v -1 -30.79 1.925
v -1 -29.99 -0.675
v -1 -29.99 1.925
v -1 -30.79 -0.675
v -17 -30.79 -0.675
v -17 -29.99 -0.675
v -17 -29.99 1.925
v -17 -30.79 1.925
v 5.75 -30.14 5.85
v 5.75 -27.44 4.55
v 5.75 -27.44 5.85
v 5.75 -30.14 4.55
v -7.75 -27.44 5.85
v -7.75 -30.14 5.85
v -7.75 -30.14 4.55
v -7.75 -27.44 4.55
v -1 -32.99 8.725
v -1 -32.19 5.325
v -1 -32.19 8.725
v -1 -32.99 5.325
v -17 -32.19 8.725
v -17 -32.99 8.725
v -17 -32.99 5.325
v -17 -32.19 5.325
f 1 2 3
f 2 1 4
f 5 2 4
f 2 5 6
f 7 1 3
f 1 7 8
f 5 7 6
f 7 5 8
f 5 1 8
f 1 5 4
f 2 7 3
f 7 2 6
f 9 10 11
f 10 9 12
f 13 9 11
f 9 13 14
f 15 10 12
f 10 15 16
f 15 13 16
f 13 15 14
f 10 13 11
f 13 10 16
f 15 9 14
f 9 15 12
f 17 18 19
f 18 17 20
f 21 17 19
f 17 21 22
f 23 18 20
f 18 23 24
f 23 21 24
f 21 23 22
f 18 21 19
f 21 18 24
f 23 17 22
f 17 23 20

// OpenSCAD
include <BOSL2/std.scad>
include <BOSL2/rounding.scad>
vf=360;
//version number
version="10"; //version number
version_h=1; //depth of version number pocket

//epsilon value
eps=0.01;

//CASE BODY
//case stackup
echo("----------CASE----------");
face_h = 1.4;
lcd_h = 2.2;
pcb_h = 1.6;
standoff_h = 3.4;
floor_h = 1.4; //was 1.6... //was 2.4

top_h = face_h+lcd_h+pcb_h;
bottom_h = pcb_h+standoff_h+floor_h;
case_h=face_h+lcd_h+pcb_h+standoff_h+floor_h;
echo(top_h=top_h, bottom_h=bottom_h, case_h=case_h);

standoff_cut = 8.4; //length of the standoff arm excluding the rounded bit
standoff_d = 3; //diameter of standoff rounded bit

//mating walls
wall_inner_xy = 0.8; //inner wall thickness EACH side
wall_gap_xy=0.6; //was 0.6, but changed to one extruder width //gap between walls EACH side
wall_outer_xy=0.8; //outer wall thickness
wall_width=wall_inner_xy+wall_gap_xy+wall_outer_xy;
echo(wall_width=wall_width);

//pcb dimentions and tolerance
pcb_xy = 60;
pcb_tolerance_xy = 0.4; //spacing on EACH side
pcb_cavity_xy=(pcb_tolerance_xy*2)+pcb_xy; //bottom half PCB cavity
top_cavity_xy=pcb_cavity_xy+(wall_gap_xy*2)+(wall_inner_xy*2); //pcb+innerwall cavity in top
echo(pcb_cavity_xy=pcb_cavity_xy, top_cavity_xy=top_cavity_xy);

//full outer case dimentions
body_xy=(wall_outer_xy*2)+(wall_gap_xy*2)+(wall_inner_xy*2)+pcb_cavity_xy;
echo(body_xy=body_xy);

//edge chamfers, top and bottom
chamfer_top_h=2.4;
chamfer_bottom_h=1.4;

//TOP CASE FEATURES
//LCD body
lcd_x=34.6 + 2; //36.8;
lcd_y=47.8 + 2; //52.2;
//LCD viewable area
lcd_va_x=33.6 - 1; //32.4; 
lcd_va_y=43.6 - 1; //42.8;
lcd_va_base_h = 0.4; //two layers of material without chamfer on top of lcd
lcd_va_chamfer_h = face_h - lcd_va_base_h; //the chamfered "view port"
lcd_va_offset_y = 1.8 + (1/2); //from top of LCD body to top of viewable area

//10P header
head_10p_x = 11.6;
head_10p_y = 29.00;
head_10p_offset=4;

echo("------PROGRAMMING HEADER-------");
//cut in bottom of top half to accomidate the ends/solder of the programming header on the bottom layer
head_prog_x = 2.54+.4;
head_prog_y=(2.54*3)+0.55;
head_prog_bottom_h=lcd_h;  //bottom of header (top of PCB, top of case)
head_prog_top_h=floor_h;
head_prog_offset_x=10.75;
head_prog_offset_y=9.6;//9.6
head_prog_connector_max_h=floor_h+standoff_h;
echo(head_prog_connector_max_h=head_prog_connector_max_h);

//from datasheet for milled, low profile pin header
head_prog_connector_total_h=7.43;
head_prog_connector_pin_h=2.7;
head_prog_connector_body_h= head_prog_connector_total_h-head_prog_connector_pin_h;
head_prog_connector_clearance_h=head_prog_connector_max_h-head_prog_connector_body_h;
echo(head_prog_connector_body_h=head_prog_connector_body_h, head_prog_connector_clearance_h=head_prog_connector_clearance_h );

//mounting screws
echo("----------SCREWS----------");
screw_d=3.4;
screw_offset_xy=4;
screw_head_h=1.7;
screw_head_d1=screw_d;
screw_head_d2=6.2;
heatset_nut_d=4.4; //4.3/3.9;
heatset_nut_max_h=floor_h+standoff_h;
screw_distance_to_nut_h=top_h;
echo(screw_distance_to_nut_h=screw_distance_to_nut_h);

screw_h=8;
screw_depth_nut_h=screw_h-screw_distance_to_nut_h;
echo(screw_h=screw_h, screw_depth_nut_h=screw_depth_nut_h);

echo("----------NUTS----------");
heatset_nut_h=3;
heatset_nut_bottom_clearance_h=.8; //how much deeper should the hole be than the nut? effects minimum floor thickness
heatset_nut_unused_h=heatset_nut_h-screw_depth_nut_h;
echo(heatset_nut_max_h=heatset_nut_max_h);
echo(heatset_nut_h=heatset_nut_h,heatset_nut_unused_h=heatset_nut_unused_h);

//push buttons (with countersink)  
//assumes center button is at Y=0 (centered)  
echo("--------USER BUTTONS--------");
button_distance_to_top=face_h+lcd_h;
echo(button_distance_to_top=button_distance_to_top);

//button body cutout
butt_body_x=9.2;
butt_body_y=28; 
butt_body_h=1.5;
butt_body_cavity_h=0.8; 
echo(butt_body_cavity_h=butt_body_cavity_h);

//This is stack up for short buttons with button caps
butt_cap_h=4;
butt_cap_d=5+.4;
butt_cap_rim_h=1; 
butt_cap_rim_d=6.8+.4;
butt_cap_center_extra_space_d=0.2; //for some reason our printer makes the center hole slightly too tight, so we add some space
//This is the 1mm cap rim + 0.7 of the button body height +0.1 (even layer height)
//(to keep cap rim being stuck under the case)
butt_cap_rim_cavity_h=butt_cap_rim_h+(butt_body_h-butt_body_cavity_h)+.1;
echo(butt_cap_rim_cavity_h=butt_cap_rim_cavity_h);
butt_cap_shaft_h=button_distance_to_top-butt_body_cavity_h-butt_cap_rim_cavity_h;
echo(butt_cap_shaft_h=butt_cap_shaft_h);

//This is stack up with long shaft button
//counter sink 
butt_sink_h=1.7; 
butt_sink_d1=3.2;
butt_sink_d2=6.2;
//button hole
butt_offset_x=7.2; //edge of pcb to center of button
butt_spread_y=10; //center of center button to center of top and bottom buttons
butt_hole_d=3.2;
butt_hole_h=top_h-(pcb_h+butt_body_h+butt_sink_h);





//BOTTOM CASE FEATURES
//retaining lip for the case
bottom_lip_width=wall_gap_xy+wall_outer_xy;
bottom_lip_h=pcb_h;

//sd card hole
sd_x=14;
sd_y=wall_width;
sd_offset_x=22;
sd_h=3.4;

//9p aux la header hole
head_aux_x=wall_width;
head_aux_y=12.8;
head_aux_h=4.8;

//USB C hole (currently blown out)
usb_x=wall_width;
usb_y=14; //blow out
usb_h=5.6; //blow out, 3.2;
print_layer_h=0.2;
usb_cut_layers=2;

//bootloader button hole
bootload_x=3;
bootload_y=4;
bootload_h=floor_h;
bootload_offset_x=27; //from top of flipped PCB
bootload_offset_y=14;    //from right of flipped PCB
bootload_spin=45;
echo("----------END----------");

//
// CASE TOP MODULES
//
module body_top(){
    //case body
    diff("mask"){
        cube(size=[body_xy, body_xy,top_h], anchor=BOTTOM){
            //top chamfer
            chamfer_list=[RIGHT, LEFT, BACK, FRONT];
            for( i = chamfer_list){
            edge_mask(TOP+i)
                chamfer_edge_mask(l=body_xy, chamfer=chamfer_top_h);
            }                        
        }    
    }
}

module cavity_top(){    
    //PCB area in top
    translate([0,0,-eps]){
        cube(size=[top_cavity_xy, top_cavity_xy, pcb_h+eps], anchor=BOTTOM);
    }
}

module lcd(){
    //LCD
    lcd_va_chamfer_eps_h=lcd_va_chamfer_h+eps+eps;
    translate([0,0,pcb_h]){
        union(){
            //body
            translate([0,0,-eps]){
                cube(size=[lcd_x, lcd_y, lcd_h+eps], anchor=BOTTOM);
            }
            //view area base (0.4=2 layers)
             translate([0, lcd_va_offset_y, lcd_h-eps]){
                 cube(size=[lcd_va_x, lcd_va_y, lcd_va_base_h+eps], anchor=BOTTOM);
            }           
            //view area chamfer, 45 degrees
            translate([0, lcd_va_offset_y, (lcd_h+lcd_va_base_h)-eps]){
                prismoid(size1=[lcd_va_x, lcd_va_y], size2=[lcd_va_x+(lcd_va_chamfer_eps_h*2), lcd_va_y+(lcd_va_chamfer_eps_h*2)], h=lcd_va_chamfer_eps_h);
            }
        }
    }
}

module screws(){
    //screw holes
    for(a=[1:-2:-1]){
        for(b=[1:-2:-1]){
             translate([a*((pcb_xy/2)-screw_offset_xy),b*((pcb_xy/2)-screw_offset_xy),0]){
                union(){
                    //shaft
                    translate([0,0,-eps]){
                        cylinder(h=(top_h-screw_head_h)+eps, d=screw_d, anchor=BOTTOM, $fn=100);
                    }
                    //countersink
                    translate([0,0,top_h-screw_head_h-eps]){
                        cylinder(h = screw_head_h+eps+eps, d1 = screw_head_d1, d2 = screw_head_d2, anchor=BOTTOM, $fn=100);
                    }
                }
            }
        }
    }
}

module buttons(){
     //buttons
    translate([-((pcb_xy/2)-butt_offset_x), 0,pcb_h]){
        union(){
            //button body
            translate([0,0,-eps]){
                cube(size=[butt_body_x, butt_body_y, butt_body_cavity_h+eps], anchor=BOTTOM);
            }
            //button holes
            if(0){
            //for(a=[-1:1:1]){
                translate([ 0, butt_spread_y*a, butt_body_cavity_h]){
                    union(){
                        translate([0,0,-eps]){
                            cylinder(h=butt_hole_h+eps , d=butt_hole_d, anchor=BOTTOM, $fn=100);  
                        }
                        translate([0,0,butt_hole_h-eps]){
                            cylinder(h = butt_sink_h+eps+eps, d1 = butt_sink_d1, d2 = butt_sink_d2, anchor=BOTTOM, $fn=100);
                        }                         
                    }
                }
            //}
            }
        }
    }

    butt_cap_extra_clear_d=[0,butt_cap_center_extra_space_d,0];
    //button holes for caps
    //for(a=[-1:1:1]){
        a=0;
        translate([ -((pcb_xy/2)-butt_offset_x), butt_spread_y*a, pcb_h+butt_body_cavity_h-eps]){
            translate([0,0,-eps]){
                cylinder(h = butt_cap_rim_cavity_h + eps, d =(butt_cap_rim_d + butt_cap_extra_clear_d[a+1]), anchor=BOTTOM, $fn=100);
            }
            translate([0,0,butt_cap_rim_cavity_h-eps]){
                cylinder(h = butt_cap_h+eps, d = butt_cap_d + butt_cap_extra_clear_d[a+1], anchor=BOTTOM, $fn=100);
            }  
        }
    //}       
}

module header_10P(){
    //10p header
    translate([(body_xy/2)+eps,0,-eps]){
        cube(size=[head_10p_x+eps, head_10p_y, top_h+eps+eps], anchor=BOTTOM+RIGHT);
    }
}

module header_prog_top(){
    //programming header cutout
    translate([-1*((pcb_xy/2)-head_prog_offset_x),-1*((pcb_xy/2)-head_prog_offset_y),pcb_h-eps]){
        cube(size=[head_prog_x,head_prog_y,head_prog_bottom_h+eps], anchor=BOTTOM);
    }
}                                                       

//
// CASE BOTTOM MODULES
//
module body_bottom(){
    //bottom and chamfers
    diff("mask"){
        cube(size=[body_xy, body_xy,bottom_h], anchor=BOTTOM){
            //bottom chamfer
            chamfer_list=[RIGHT, LEFT, BACK, FRONT];
            for( i = chamfer_list){
            edge_mask(BOTTOM+i)
                chamfer_edge_mask(l=body_xy, chamfer=chamfer_bottom_h);
            }                
        }   
    } 
} 

module pcb(){
    //PCB
    translate([0,0,(standoff_h+floor_h)]){
        cube(size=[pcb_cavity_xy, pcb_cavity_xy, pcb_h+eps], anchor=BOTTOM);
    }
}

module standoffs(){
    //standoffs
    standoff_edge = pcb_cavity_xy - (standoff_cut*2);
    shape = [[0,standoff_cut], [0,standoff_cut+standoff_edge], [standoff_cut,standoff_cut+standoff_edge], //left
            [standoff_cut,standoff_cut+standoff_edge+standoff_cut], [standoff_cut+standoff_edge, standoff_cut+standoff_edge+standoff_cut], [standoff_cut+standoff_edge, standoff_edge+standoff_cut], //top
            [standoff_cut+standoff_edge+standoff_cut, standoff_edge+standoff_cut], [standoff_cut+standoff_edge+standoff_cut,standoff_cut], [standoff_cut+standoff_edge,standoff_cut], //right
            [standoff_cut+standoff_edge,0], [standoff_cut,0], [standoff_cut,standoff_cut]]; //bottom
    radii = [0, 0, standoff_d, 0, 0, standoff_d, 0, 0, standoff_d, 0, 0, standoff_d];
    translate([-pcb_cavity_xy/2, -pcb_cavity_xy/2, floor_h]){
        linear_extrude(height=standoff_h+eps){
            polygon(round_corners(shape, radius = radii,$fn=64));
        }
    }  
}

module heatset_nuts(){
    //screw holes
    for(a=[1:-2:-1]){
        for(b=[1:-2:-1]){
            translate([a*((pcb_xy/2)-screw_offset_xy),b*((pcb_xy/2)-screw_offset_xy),heatset_nut_max_h-heatset_nut_h]){
                cylinder(h=heatset_nut_h+heatset_nut_bottom_clearance_h+eps, d=heatset_nut_d, anchor=BOTTOM, $fn=100);
            }
        }
    }    
}

module old_sd_card(){
    //sd card
    translate([-((body_xy/2)-sd_offset_x),-1*((body_xy/2)+eps),bottom_h+eps]){
        #cube(size=[sd_x,sd_y+eps+eps+eps,sd_h+eps], anchor=TOP+FRONT+LEFT);
    }    
}

module sd_card(){
    //la aux header
    //0.8mm straight (2 print beads)
    //rest chamfered (wall_width-0.8)

        //sd card
    translate([-((pcb_xy/2)-sd_offset_x),-1*((body_xy/2)-wall_width-eps),bottom_h+eps]){
        cube(size=[sd_x,0.8+eps+eps+eps,sd_h+eps], anchor=TOP+BACK+LEFT);
    }   

    translate([-((pcb_xy/2)-sd_offset_x), -1*((body_xy/2)-wall_width+0.8-eps), bottom_h-pcb_h]){
    rotate(a=[90,0,0]){        
        prismoid(size1=[sd_x,sd_h], size2=[sd_x+((wall_width-0.8)/2),sd_h+((wall_width-0.8)/2)], h=wall_width-0.8+eps+eps, anchor=BOTTOM+LEFT);
    }

    }
}


module sd_card_plug(){
    //la aux header
    //0.8mm straight (2 print beads)
    //rest chamfered (wall_width-0.8)
    sd_plug_clearance=0.5;
    cover_y=2;
        //sd card
    translate([-((pcb_xy/2)-sd_offset_x)+(sd_plug_clearance/2),-1*((body_xy/2)-wall_width-eps)+(sd_plug_clearance/2),bottom_h-pcb_h-(sd_plug_clearance/2)]){
        cube(size=[sd_x-sd_plug_clearance,wall_width+sd_plug_clearance,sd_h-pcb_h-sd_plug_clearance], anchor=TOP+BACK+LEFT);
       
        translate([-(cover_y/2)-(sd_plug_clearance/2),-wall_width-(sd_plug_clearance/2),(sd_h-pcb_h-(sd_plug_clearance/2))/2])
        cuboid(
            [sd_x+cover_y,.8,sd_h], rounding=0.4,
            edges=[TOP+FRONT,TOP+RIGHT,TOP+LEFT,FRONT+RIGHT, FRONT+LEFT,BOTTOM+FRONT, BOTTOM+LEFT, BOTTOM+RIGHT ],
            anchor=BACK+LEFT+TOP,
            $fn=64
        );

        rotate([180,0,0])
        translate([-(cover_y/2)-(sd_plug_clearance/2),sd_plug_clearance/2,(sd_h+pcb_h+(sd_plug_clearance/2))/2])
        difference(){
        cuboid(
            [sd_x+cover_y,0.8,sd_h-(cover_y/2)+(sd_plug_clearance/2)-0.05], //rounding=0.5,
            //edges=[TOP+FRONT,TOP+RIGHT,TOP+LEFT,FRONT+RIGHT, FRONT+LEFT ],
            anchor=BACK+LEFT+TOP,
            $fn=64
        );      
        translate([(sd_x+cover_y)/2,.1,-(sd_h-0.6)]) cuboid([4,1,1.8], anchor=BOTTOM+BACK);
        }  
    }   

    //translate([-((pcb_xy/2)-sd_offset_x), -1*((body_xy/2)-wall_width+0.8-eps), bottom_h-pcb_h]){
    //rotate(a=[90,0,0]){        
    //    prismoid(size1=[sd_x,sd_h], size2=[sd_x+((wall_width-0.8)/2),sd_h+((wall_width-0.8)/2)], h=wall_width-0.8+eps+eps, anchor=BOTTOM+LEFT);
    //}

    //}
}

module header_aux(){
    //la aux header
    //0.8mm straight (2 print beads)
    //rest chamfered (wall_width-0.8)

   /* translate([(body_xy/2)-wall_width-eps, 0, bottom_h-pcb_h-head_aux_x]){
        cube(size=[0.8+eps+eps+eps,head_aux_y,case_h], anchor=BOTTOM+LEFT);
     }

    translate([(body_xy/2)-eps-(wall_width-.8), 0, bottom_h-pcb_h]){
    rotate(a=[0,90,0]){        
        prismoid(size1=[head_aux_x,head_aux_y], size2=[head_aux_x+((wall_width-0.8)/2),head_aux_y+((wall_width-0.8)/2)], h=wall_width-0.8+eps+eps, anchor=BOTTOM+LEFT);
    }

    }*/

    translate([(body_xy/2)+eps, 0, bottom_h+eps]){
        cube(size=[head_aux_x+eps+eps,head_aux_y,head_aux_h], anchor=TOP+RIGHT);
    }   


}

module usb_bottom(){

    typec_d=3.16;
    typec_l=8.94;
    
    translate([-((body_xy/2)-wall_width-eps),0,bottom_h-pcb_h]){
        //inspired/informed by:
        //Object Name: Holder For TYPE-C or LIGHTNING and TRRS (e.g. Earphone Wraps) (OpenSCAD)
        //Author: Brian Khuu 2019
        //https://www.thingiverse.com/thing:3666075/files
        hull(){
            translate([0,((typec_l+0.5)-(typec_d))/2,0]){
                rotate(a=[0,90,0]) cylinder(d=typec_d, h=wall_width+eps+eps, $fn=100, anchor=TOP+LEFT);
            }
            translate([0,-((typec_l+0.5)-(typec_d))/2,0]){
                rotate(a=[0,90,0]) cylinder(d=typec_d, h=wall_width+eps+eps, $fn=100, anchor=TOP+LEFT);
            }
        }       
    }   

    //cut out the overhang, plus X layers of upper cutout curve for cleaner prints
    translate([-((body_xy/2)+eps),0,(bottom_h-pcb_h-(print_layer_h*usb_cut_layers)-eps)]){
        cube(size=[wall_width+eps+eps,((typec_l+0.5)-(typec_d))+2,usb_h], anchor=BOTTOM+LEFT);
    }      
    
}

module header_prog_bottom(){
    //programming header cutout
    head_prog_eps_h=head_prog_top_h+eps+eps;

    union(){

    translate([-1*((pcb_xy/2)-head_prog_offset_x),-1*((pcb_xy/2)-head_prog_offset_y),-eps]){
        cube(size=[head_prog_x,head_prog_y,head_prog_eps_h], anchor=BOTTOM);
    }   

    translate([-1*((pcb_xy/2)-head_prog_offset_x),-1*((pcb_xy/2)-head_prog_offset_y),-eps]){
        //cube(size=[head_prog_x,head_prog_y,head_prog_top_h+eps+eps], anchor=BOTTOM);
        prismoid(size2=[head_prog_x, head_prog_y], size1=[head_prog_x+(0.4*2)+eps, head_prog_y+(0.4*2)+eps], h=0.4);
    }   

    }
  
}

module bootloader_button(){
    //bootloader button hole
    bootload_eps_h=bootload_h+eps+eps;
    union(){
     
     translate([-1*((pcb_xy/2)-bootload_offset_x),((pcb_xy/2)-bootload_offset_y),-eps]){
        cube(size=[bootload_x,bootload_y,bootload_eps_h], anchor=BOTTOM, spin=bootload_spin);
    }       
     
     translate([-1*((pcb_xy/2)-bootload_offset_x),((pcb_xy/2)-bootload_offset_y),-eps]){
        //cube(size=[bootload_x,bootload_y,bootload_h+eps+eps], anchor=BOTTOM, spin=bootload_spin);
        prismoid(size2=[bootload_x,bootload_y], size1=[bootload_x+((bootload_eps_h-.8)*2), bootload_y+((bootload_eps_h-.8)*2)], h=bootload_eps_h-.8, spin=bootload_spin);
    }      
    }
}
    
module bottom_lip(){
    //mating edge lips
    translate([0,0,bottom_h+eps]){
        difference(){
            cube(size=[body_xy+eps, body_xy+eps, bottom_lip_h+eps], anchor=TOP);
            cube(size=[body_xy-(2*bottom_lip_width), body_xy-(2*bottom_lip_width),bottom_lip_h+eps], anchor=TOP);
        }
    } 

}

//
// CASE ASSEMBLY
//
module version_number(){
    linear_extrude(version_h){
        text(text=str("v",version), size=4, font = "Liberation Sans:style=Bold");
    }
}
module case_top(){
    difference(){
        body_top();
        cavity_top();
        lcd();
        screws();
        buttons();
        header_10P();
        header_prog_top();

        //add version number
        rotate([0,180,0]){
            translate([0, -31, -(version_h+(pcb_h-eps))]){
                //version_number();
            }
        }

    }            

}

module case_bottom(){



    difference(){
        body_bottom();
        pcb();
        standoffs();
        heatset_nuts();
        sd_card();
        header_aux();
        usb_bottom();
        header_prog_bottom();
        bootloader_button();
        bottom_lip();

        //add version number
        translate([0, -30, (floor_h+eps)-version_h]){
            //version_number();
        }        
    }

    translate([(body_xy/2)-wall_width,0,0]){
        difference(){

            //12.4
            cube([2, head_aux_y+1.4, bottom_h-pcb_h], anchor=BOTTOM+RIGHT);
            translate([eps,0,0]) cube([4+eps+eps,11.4,bottom_h-pcb_h+eps], anchor=BOTTOM+RIGHT);
        }
    }
}

//
// CASE DISPLAY
//
module print_3d(){
    translate([(body_xy/2)+2,0,top_h]){
        rotate([180,0,0]){
            case_top();
        }
    }
    translate([-((body_xy/2)+2),0,0]){
        case_bottom();
    }
}

module display_together(){
    translate([0,0,bottom_h+20]){

            case_top();
    }
    case_bottom();

}

module display_together_tight(){
    translate([0,0,bottom_h+.2]){

            case_top();
    }
    case_bottom();

}

//print_3d();
//case_top();
//case_bottom();
//display_together();
//display_together_tight();
#sd_card_plug();
    
